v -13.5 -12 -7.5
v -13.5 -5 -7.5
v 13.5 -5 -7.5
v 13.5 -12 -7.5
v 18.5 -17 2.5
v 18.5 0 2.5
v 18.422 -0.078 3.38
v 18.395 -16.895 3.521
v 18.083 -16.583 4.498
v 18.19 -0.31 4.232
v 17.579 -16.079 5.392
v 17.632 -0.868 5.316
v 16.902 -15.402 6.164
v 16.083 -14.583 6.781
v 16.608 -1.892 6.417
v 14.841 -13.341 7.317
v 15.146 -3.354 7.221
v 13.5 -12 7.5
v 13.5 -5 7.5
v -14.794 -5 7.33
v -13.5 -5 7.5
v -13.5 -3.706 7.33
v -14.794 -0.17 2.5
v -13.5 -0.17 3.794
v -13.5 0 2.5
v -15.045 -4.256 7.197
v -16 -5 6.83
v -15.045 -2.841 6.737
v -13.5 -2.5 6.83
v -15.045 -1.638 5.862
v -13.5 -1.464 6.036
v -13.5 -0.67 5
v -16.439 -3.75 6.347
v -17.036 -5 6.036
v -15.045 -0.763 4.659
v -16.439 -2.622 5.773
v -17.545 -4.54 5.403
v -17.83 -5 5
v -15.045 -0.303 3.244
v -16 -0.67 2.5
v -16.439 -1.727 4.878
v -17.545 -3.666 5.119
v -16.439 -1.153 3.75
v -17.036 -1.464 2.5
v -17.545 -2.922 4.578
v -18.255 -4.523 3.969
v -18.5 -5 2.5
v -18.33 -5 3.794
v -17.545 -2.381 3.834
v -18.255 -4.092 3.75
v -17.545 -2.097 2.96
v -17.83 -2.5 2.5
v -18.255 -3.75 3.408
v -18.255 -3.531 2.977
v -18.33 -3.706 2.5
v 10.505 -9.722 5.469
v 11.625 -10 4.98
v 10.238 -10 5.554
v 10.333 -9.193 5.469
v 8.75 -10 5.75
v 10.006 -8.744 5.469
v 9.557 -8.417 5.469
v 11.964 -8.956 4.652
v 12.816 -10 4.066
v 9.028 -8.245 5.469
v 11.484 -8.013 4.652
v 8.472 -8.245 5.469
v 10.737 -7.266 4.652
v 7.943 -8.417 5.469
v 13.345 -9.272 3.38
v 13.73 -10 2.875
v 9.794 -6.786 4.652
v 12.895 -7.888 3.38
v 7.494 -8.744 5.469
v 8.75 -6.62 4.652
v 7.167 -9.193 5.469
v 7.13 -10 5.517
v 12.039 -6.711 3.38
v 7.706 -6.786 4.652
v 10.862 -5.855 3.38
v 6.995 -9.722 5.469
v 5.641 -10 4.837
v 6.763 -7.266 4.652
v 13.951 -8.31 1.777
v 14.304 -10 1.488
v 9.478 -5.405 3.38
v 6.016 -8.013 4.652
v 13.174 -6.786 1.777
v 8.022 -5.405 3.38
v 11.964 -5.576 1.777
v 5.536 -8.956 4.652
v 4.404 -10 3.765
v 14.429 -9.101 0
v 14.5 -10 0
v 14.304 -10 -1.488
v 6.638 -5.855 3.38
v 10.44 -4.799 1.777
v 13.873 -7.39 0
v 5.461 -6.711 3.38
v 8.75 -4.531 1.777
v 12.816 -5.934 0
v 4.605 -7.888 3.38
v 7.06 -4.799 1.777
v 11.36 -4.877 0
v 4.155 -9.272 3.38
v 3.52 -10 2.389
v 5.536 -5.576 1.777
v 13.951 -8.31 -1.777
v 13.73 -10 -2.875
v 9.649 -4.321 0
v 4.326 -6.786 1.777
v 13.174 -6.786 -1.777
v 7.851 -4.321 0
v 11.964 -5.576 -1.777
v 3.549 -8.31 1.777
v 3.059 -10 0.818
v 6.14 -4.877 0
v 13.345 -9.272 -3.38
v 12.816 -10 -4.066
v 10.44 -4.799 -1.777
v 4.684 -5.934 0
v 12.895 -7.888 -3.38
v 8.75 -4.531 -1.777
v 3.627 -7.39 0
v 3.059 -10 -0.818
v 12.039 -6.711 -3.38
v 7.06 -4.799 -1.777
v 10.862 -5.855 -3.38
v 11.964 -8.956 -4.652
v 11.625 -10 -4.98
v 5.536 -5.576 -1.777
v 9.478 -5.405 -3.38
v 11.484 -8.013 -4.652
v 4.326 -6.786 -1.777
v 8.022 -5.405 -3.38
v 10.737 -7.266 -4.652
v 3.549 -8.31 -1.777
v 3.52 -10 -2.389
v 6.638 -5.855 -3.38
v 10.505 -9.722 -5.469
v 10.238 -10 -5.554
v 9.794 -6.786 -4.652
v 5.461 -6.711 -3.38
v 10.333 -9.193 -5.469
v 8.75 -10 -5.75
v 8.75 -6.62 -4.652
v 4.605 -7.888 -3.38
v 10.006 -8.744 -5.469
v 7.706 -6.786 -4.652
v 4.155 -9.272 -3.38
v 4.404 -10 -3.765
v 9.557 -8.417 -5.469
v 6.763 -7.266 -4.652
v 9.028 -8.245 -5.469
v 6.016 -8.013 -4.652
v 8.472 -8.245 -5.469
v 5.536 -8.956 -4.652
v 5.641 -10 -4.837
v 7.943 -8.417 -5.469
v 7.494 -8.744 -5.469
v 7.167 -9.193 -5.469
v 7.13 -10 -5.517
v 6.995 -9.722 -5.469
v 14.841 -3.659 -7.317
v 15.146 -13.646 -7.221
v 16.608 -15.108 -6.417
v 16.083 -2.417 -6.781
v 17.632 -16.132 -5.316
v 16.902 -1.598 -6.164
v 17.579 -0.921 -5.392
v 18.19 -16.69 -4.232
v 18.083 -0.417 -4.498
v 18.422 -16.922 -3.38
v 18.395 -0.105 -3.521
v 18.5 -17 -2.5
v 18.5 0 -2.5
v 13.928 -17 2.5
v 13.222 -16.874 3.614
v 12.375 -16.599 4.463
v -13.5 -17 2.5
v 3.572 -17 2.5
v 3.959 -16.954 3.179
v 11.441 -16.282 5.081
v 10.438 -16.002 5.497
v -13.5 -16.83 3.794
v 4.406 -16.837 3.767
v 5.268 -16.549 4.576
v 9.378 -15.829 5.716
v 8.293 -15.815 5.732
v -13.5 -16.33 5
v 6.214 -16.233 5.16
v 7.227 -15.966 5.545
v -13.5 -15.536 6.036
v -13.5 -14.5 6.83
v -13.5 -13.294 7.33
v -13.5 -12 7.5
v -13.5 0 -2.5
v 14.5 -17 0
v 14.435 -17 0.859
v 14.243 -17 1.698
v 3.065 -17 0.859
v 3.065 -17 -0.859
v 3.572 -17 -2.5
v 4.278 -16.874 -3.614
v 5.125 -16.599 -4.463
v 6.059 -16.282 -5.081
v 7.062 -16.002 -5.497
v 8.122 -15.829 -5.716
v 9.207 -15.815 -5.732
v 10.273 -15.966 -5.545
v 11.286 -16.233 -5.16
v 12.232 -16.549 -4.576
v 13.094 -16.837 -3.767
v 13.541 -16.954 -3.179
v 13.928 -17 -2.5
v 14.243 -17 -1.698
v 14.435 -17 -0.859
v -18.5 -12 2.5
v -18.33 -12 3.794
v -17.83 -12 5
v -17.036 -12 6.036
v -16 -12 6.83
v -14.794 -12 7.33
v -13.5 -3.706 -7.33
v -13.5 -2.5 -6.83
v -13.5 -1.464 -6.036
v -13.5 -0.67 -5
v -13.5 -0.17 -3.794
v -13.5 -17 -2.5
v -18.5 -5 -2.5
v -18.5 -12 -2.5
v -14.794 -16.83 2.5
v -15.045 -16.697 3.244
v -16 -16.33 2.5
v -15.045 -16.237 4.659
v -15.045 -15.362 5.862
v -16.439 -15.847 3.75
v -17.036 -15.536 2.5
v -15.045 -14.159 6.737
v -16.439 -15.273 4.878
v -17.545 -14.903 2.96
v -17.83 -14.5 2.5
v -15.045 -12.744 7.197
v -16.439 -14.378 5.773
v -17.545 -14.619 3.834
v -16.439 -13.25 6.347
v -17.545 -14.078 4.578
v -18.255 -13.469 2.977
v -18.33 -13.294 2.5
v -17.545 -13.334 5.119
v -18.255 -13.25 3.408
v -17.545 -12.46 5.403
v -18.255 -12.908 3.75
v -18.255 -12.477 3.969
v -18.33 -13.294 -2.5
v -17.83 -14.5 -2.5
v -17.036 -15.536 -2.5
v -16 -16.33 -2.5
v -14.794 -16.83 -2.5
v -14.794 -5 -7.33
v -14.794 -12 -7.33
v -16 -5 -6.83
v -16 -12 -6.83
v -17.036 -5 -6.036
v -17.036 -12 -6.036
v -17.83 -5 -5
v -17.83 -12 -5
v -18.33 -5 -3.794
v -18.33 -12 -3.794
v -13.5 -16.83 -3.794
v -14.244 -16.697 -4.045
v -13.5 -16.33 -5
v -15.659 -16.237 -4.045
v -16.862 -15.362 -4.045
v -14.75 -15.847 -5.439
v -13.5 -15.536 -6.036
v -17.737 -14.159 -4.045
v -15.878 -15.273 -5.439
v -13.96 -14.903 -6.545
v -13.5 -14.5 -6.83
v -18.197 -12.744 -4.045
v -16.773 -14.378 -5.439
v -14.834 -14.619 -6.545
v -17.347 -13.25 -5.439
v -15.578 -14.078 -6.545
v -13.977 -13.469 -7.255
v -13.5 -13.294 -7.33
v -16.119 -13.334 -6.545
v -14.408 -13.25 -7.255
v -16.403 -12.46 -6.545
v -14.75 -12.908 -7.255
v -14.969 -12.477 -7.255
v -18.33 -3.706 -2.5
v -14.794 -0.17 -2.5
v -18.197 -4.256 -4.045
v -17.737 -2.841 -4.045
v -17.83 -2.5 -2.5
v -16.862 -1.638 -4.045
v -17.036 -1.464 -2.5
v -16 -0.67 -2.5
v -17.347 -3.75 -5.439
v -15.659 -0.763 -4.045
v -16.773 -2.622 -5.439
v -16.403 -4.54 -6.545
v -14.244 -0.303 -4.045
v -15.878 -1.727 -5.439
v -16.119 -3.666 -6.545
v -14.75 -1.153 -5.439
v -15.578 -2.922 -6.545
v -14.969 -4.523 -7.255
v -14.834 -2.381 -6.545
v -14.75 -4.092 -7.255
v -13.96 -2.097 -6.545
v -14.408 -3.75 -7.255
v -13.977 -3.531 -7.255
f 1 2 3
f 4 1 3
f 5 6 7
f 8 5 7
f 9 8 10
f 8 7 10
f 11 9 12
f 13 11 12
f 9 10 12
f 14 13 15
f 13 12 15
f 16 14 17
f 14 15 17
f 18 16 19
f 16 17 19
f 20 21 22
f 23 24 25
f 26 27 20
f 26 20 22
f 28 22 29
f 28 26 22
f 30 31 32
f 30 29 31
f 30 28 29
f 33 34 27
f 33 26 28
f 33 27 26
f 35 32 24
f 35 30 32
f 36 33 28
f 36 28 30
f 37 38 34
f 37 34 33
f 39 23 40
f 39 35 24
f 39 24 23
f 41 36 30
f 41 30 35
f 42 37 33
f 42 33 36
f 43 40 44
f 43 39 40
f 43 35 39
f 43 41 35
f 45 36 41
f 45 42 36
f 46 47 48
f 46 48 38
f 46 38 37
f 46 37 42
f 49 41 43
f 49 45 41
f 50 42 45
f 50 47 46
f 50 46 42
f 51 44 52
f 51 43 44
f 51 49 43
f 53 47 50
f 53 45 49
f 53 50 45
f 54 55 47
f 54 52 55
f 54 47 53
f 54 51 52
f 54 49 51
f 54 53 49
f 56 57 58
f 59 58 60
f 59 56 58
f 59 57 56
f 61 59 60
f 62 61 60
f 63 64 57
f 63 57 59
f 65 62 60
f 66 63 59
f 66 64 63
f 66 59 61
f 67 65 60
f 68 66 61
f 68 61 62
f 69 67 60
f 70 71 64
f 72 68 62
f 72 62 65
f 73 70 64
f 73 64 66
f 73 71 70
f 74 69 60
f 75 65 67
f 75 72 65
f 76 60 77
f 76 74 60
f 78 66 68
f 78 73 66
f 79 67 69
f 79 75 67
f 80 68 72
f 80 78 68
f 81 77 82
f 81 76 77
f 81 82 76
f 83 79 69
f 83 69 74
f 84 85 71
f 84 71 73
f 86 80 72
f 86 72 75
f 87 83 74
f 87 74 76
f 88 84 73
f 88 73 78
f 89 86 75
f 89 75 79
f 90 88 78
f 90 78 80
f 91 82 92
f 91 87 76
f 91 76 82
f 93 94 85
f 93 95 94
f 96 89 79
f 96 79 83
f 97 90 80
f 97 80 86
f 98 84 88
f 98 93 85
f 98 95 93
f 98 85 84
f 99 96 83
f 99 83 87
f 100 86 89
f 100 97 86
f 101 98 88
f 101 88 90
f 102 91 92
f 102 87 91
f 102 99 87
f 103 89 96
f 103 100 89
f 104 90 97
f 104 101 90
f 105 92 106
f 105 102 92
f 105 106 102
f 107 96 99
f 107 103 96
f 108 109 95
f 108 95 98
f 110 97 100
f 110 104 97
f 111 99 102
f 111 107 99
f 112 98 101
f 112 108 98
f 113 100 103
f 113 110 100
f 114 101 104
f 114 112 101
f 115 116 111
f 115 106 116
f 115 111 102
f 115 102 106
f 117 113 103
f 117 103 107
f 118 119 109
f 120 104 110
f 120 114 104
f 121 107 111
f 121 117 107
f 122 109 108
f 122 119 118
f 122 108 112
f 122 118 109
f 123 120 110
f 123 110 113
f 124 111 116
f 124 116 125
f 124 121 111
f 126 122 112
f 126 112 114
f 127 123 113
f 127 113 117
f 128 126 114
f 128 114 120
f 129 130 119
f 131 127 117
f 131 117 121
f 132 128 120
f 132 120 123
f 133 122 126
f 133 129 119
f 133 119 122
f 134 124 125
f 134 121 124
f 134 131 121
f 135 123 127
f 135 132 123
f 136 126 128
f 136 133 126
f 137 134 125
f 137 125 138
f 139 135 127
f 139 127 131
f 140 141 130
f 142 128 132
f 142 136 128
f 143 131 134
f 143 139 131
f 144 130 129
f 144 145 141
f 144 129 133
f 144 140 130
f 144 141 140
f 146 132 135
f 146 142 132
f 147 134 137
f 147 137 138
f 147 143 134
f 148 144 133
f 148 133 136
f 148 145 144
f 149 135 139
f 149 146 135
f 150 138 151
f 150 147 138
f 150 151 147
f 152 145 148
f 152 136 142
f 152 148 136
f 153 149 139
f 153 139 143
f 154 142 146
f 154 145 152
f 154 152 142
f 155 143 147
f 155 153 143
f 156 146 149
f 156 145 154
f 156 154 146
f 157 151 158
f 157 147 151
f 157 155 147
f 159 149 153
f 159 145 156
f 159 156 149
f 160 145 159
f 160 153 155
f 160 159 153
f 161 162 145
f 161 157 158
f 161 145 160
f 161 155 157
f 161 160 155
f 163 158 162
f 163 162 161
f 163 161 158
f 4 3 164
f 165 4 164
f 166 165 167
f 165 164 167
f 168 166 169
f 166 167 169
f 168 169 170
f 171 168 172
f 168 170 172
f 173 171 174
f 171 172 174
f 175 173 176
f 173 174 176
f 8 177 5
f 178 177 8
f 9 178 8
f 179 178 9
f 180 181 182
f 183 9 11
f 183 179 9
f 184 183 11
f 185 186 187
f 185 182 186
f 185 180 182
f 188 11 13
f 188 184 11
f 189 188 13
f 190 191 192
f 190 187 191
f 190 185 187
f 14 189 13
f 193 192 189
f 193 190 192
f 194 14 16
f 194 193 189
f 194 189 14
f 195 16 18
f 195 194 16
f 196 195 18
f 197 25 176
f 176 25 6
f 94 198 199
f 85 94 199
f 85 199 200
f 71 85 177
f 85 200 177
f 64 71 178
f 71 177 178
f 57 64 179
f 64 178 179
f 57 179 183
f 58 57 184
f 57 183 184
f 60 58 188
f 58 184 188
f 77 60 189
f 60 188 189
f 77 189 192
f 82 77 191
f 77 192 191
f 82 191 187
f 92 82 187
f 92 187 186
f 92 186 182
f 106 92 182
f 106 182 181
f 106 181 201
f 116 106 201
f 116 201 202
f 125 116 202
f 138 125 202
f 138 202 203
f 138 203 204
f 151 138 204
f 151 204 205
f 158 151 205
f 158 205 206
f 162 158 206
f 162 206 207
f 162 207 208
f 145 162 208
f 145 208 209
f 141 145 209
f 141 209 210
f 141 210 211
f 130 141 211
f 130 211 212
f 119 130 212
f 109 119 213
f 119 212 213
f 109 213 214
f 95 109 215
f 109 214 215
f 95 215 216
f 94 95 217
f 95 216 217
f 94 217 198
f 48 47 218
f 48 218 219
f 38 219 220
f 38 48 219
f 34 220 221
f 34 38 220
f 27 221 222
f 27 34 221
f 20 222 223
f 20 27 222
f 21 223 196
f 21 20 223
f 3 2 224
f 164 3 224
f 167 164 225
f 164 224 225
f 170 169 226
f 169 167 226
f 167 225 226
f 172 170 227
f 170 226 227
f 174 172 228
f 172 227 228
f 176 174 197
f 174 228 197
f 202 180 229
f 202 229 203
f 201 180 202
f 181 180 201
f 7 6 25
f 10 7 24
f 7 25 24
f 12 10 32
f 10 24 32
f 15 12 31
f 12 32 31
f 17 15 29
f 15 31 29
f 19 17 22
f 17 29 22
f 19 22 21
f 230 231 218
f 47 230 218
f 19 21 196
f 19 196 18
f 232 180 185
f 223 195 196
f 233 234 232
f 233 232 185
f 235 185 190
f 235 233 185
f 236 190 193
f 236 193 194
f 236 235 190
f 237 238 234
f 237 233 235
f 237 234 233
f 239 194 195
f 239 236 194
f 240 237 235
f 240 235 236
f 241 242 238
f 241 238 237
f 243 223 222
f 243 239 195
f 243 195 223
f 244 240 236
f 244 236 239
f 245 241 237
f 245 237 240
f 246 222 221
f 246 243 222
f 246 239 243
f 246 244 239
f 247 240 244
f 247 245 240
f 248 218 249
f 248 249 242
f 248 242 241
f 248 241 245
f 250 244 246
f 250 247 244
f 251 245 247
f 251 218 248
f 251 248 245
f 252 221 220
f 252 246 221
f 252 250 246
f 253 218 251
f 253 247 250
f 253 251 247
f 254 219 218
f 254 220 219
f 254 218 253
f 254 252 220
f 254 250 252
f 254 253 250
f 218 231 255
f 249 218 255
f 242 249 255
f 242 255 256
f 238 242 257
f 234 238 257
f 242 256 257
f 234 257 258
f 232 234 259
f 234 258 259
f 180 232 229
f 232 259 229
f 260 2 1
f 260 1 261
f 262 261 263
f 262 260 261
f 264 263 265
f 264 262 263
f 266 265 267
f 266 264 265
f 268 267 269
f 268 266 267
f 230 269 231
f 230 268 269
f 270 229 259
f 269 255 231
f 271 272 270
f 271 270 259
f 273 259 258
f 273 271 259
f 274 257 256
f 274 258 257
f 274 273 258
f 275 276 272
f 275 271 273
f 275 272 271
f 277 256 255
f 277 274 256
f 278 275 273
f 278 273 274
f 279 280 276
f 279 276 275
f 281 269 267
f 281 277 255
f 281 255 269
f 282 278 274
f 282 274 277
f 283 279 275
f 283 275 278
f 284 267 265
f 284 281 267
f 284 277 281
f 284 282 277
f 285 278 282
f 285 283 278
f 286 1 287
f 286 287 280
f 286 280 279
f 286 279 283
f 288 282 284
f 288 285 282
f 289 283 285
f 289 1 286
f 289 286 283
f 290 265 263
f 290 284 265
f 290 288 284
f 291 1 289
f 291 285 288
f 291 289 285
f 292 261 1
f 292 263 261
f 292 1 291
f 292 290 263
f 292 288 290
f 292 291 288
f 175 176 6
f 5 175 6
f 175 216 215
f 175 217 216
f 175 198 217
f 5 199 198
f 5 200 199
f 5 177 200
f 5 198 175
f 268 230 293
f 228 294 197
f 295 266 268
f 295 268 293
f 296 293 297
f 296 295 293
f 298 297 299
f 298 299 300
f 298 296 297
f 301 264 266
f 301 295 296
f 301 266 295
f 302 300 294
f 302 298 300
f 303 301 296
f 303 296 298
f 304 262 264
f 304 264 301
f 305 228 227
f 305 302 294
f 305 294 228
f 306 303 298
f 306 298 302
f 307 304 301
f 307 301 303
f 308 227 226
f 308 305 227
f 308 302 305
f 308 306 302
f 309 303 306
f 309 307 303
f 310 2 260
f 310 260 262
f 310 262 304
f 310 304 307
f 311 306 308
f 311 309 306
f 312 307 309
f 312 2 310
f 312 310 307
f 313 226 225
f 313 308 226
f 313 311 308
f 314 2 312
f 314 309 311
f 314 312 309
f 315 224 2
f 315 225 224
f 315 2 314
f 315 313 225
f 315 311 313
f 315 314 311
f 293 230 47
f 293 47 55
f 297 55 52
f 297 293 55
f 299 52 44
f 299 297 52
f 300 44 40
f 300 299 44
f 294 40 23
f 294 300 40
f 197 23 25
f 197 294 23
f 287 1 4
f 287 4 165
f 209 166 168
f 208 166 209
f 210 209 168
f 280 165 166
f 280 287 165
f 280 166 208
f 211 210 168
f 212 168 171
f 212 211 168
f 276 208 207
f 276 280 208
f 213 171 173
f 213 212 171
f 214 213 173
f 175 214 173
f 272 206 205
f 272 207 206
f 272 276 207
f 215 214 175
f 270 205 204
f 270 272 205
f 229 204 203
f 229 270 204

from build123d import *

# Parameters (mm, degrees)
F0_W         = 37
F0_H         = 15
F1_DEPTH     = 17
F2_R         = 5.75
F3_DEPTH     = 7
F6_T1_DEPTH  = 44.5
F6_T3_DEPTH  = 42
F6_T5_DEPTH  = 7
F6_T7_DEPTH  = 5
F6_S11_W     = 5
F6_S11_H     = 5
F6_T12_DEPTH = 5
F6_S17_W     = 5
F6_S17_H     = 5
F6_T18_DEPTH = 5
F6_S23_W     = 5
F6_S23_H     = 5
F6_T24_DEPTH = 5
F6_S29_W     = 5
F6_S29_H     = 5
F6_T30_DEPTH = 5


# Not quite as in the source:
# - a fillet or chamfer that OpenCascade refuses, or shapes differently, is made with other operations: its cross-section is extruded or revolved along the edge and cut away or added


with BuildPart() as f1:
    # F0 (on Front) → F1 (new body)
    with BuildSketch(Plane.XZ):
        Rectangle(F0_W, F0_H)
    extrude(amount=F1_DEPTH)

    # F2 (on face) → F3 (cut)
    with BuildSketch(Plane.XZ.offset(17)):
        with Locations((8.75, 0)):
            Circle(F2_R)
    extrude(amount=-F3_DEPTH, mode=Mode.SUBTRACT)

    # F4 (on face) → F5 (revolve, cut)
    with BuildSketch(Plane.XZ.offset(10)):
        with BuildLine():
            Line((8.75, 0), (8.75, 5.75))
            ThreePointArc((8.75, 5.75), (3, 0), (8.75, -5.75))
            Line((8.75, -5.75), (8.75, 0))
        make_face()
    revolve(axis=Axis((8.75, -10, 2.875), (0, 0, 1)), mode=Mode.SUBTRACT)

    # F6: fillet of radius 5 on 10 edges, made by hand

    # F6_s2 → F6_t1 (cut)
    with BuildSketch(Plane.YZ.offset(-13.5)):
        with BuildLine():
            ThreePointArc((-17, 2.5), (-15.5355339059, 6.0355339059), (-12, 7.5))
            Line((-12, 7.5), (-17, 7.5))
            Line((-17, 7.5), (-17, 2.5))
        make_face()
        with BuildLine():
            ThreePointArc((-12, -7.5), (-15.5355339059, -6.0355339059), (-17, -2.5))
            Line((-17, -2.5), (-17, -7.5))
            Line((-17, -7.5), (-12, -7.5))
        make_face()
        with BuildLine():
            ThreePointArc((0, 2.5), (-1.4644660941, 6.0355339059), (-5, 7.5))
            Line((-5, 7.5), (0, 7.5))
            Line((0, 7.5), (0, 2.5))
        make_face()
        with BuildLine():
            ThreePointArc((-5, -7.5), (-1.4644660941, -6.0355339059), (0, -2.5))
            Line((0, -2.5), (0, -7.5))
            Line((0, -7.5), (-5, -7.5))
        make_face()
    extrude(amount=F6_T1_DEPTH, mode=Mode.SUBTRACT)

    # F6_s4 → F6_t3 (cut)
    with BuildSketch(Plane.XZ.offset(-12.5)):
        with BuildLine():
            ThreePointArc((18.5, 2.5), (17.0355339059, 6.0355339059), (13.5, 7.5))
            Line((13.5, 7.5), (18.5, 7.5))
            Line((18.5, 7.5), (18.5, 2.5))
        make_face()
        with BuildLine():
            ThreePointArc((13.5, -7.5), (17.0355339059, -6.0355339059), (18.5, -2.5))
            Line((18.5, -2.5), (18.5, -7.5))
            Line((18.5, -7.5), (13.5, -7.5))
        make_face()
    extrude(amount=F6_T3_DEPTH, mode=Mode.SUBTRACT)

    # F6_s6 → F6_t5 (cut)
    with BuildSketch(Plane.XZ.offset(5)):
        with BuildLine():
            ThreePointArc((-18.5, 2.5), (-17.0355339059, 6.0355339059), (-13.5, 7.5))
            Line((-13.5, 7.5), (-18.5, 7.5))
            Line((-18.5, 7.5), (-18.5, 2.5))
        make_face()
        with BuildLine():
            ThreePointArc((-13.5, -7.5), (-17.0355339059, -6.0355339059), (-18.5, -2.5))
            Line((-18.5, -2.5), (-18.5, -7.5))
            Line((-18.5, -7.5), (-13.5, -7.5))
        make_face()
    extrude(amount=F6_T5_DEPTH, mode=Mode.SUBTRACT)

    # F6_s8 → F6_t7 (cut)
    with BuildSketch(Plane.XY.offset(-2.5)):
        with BuildLine():
            ThreePointArc((-18.5, -12), (-17.0355339059, -15.5355339059), (-13.5, -17))
            Line((-13.5, -17), (-18.5, -17))
            Line((-18.5, -17), (-18.5, -12))
        make_face()
        with BuildLine():
            ThreePointArc((-18.5, -5), (-17.0355339059, -1.4644660941), (-13.5, 0))
            Line((-13.5, 0), (-18.5, 0))
            Line((-18.5, 0), (-18.5, -5))
        make_face()
    extrude(amount=F6_T7_DEPTH, mode=Mode.SUBTRACT)


with BuildPart() as f6_tool10:
    # F6_s11 → F6_t12 (new body)
    with BuildSketch(Plane.YZ.offset(-13.5)):
        with Locations((-14.5, 5)):
            Rectangle(F6_S11_W, F6_S11_H)
    extrude(amount=-F6_T12_DEPTH)

    # F6_s13 → F6_t14 (revolve, cut)
    with BuildSketch(Plane(origin=(-13.5, -12, 2.5), x_dir=(0, 0.7071067812, -0.7071067812), z_dir=(0, 0.7071067812, 0.7071067812))):
        with BuildLine():
            ThreePointArc((0, -5), (5, 0), (0, 5))
            Line((0, 5), (0, -5))
        make_face()
    revolve(axis=Axis((-13.5, -12, 2.5), (-1, 0, 0)), mode=Mode.SUBTRACT)


with BuildPart() as f1_1:
    add(f1.part)

    # F6_t9: cut F6_tool10
    add(f6_tool10.part, mode=Mode.SUBTRACT)


with BuildPart() as f6_tool16:
    # F6_s17 → F6_t18 (new body)
    with BuildSketch(Plane.XY.offset(-2.5)):
        with Locations((-16, -14.5)):
            Rectangle(F6_S17_W, F6_S17_H)
    extrude(amount=-F6_T18_DEPTH)

    # F6_s19 → F6_t20 (revolve, cut)
    with BuildSketch(Plane(origin=(-13.5, -12, -2.5), x_dir=(0.7071067812, 0.7071067812, 0), z_dir=(-0.7071067812, 0.7071067812, 0))):
        with BuildLine():
            ThreePointArc((0, -5), (5, 0), (0, 5))
            Line((0, 5), (0, -5))
        make_face()
    revolve(axis=Axis((-13.5, -12, -2.5), (0, 0, -1)), mode=Mode.SUBTRACT)


with BuildPart() as f1_2:
    add(f1_1.part)

    # F6_t15: cut F6_tool16
    add(f6_tool16.part, mode=Mode.SUBTRACT)


with BuildPart() as f6_tool22:
    # F6_s23 → F6_t24 (new body)
    with BuildSketch(Plane.YZ.offset(-13.5)):
        with Locations((-2.5, 5)):
            Rectangle(F6_S23_W, F6_S23_H)
    extrude(amount=-F6_T24_DEPTH)

    # F6_s25 → F6_t26 (revolve, cut)
    with BuildSketch(Plane(origin=(-13.5, -5, 2.5), x_dir=(0, -0.7071067812, -0.7071067812), z_dir=(0, 0.7071067812, -0.7071067812))):
        with BuildLine():
            ThreePointArc((0, -5), (5, 0), (0, 5))
            Line((0, 5), (0, -5))
        make_face()
    revolve(axis=Axis((-13.5, -5, 2.5), (-1, 0, 0)), mode=Mode.SUBTRACT)


with BuildPart() as f1_3:
    add(f1_2.part)

    # F6_t21: cut F6_tool22
    add(f6_tool22.part, mode=Mode.SUBTRACT)


with BuildPart() as f6_tool28:
    # F6_s29 → F6_t30 (new body)
    with BuildSketch(Plane.XY.offset(-2.5)):
        with Locations((-16, -2.5)):
            Rectangle(F6_S29_W, F6_S29_H)
    extrude(amount=-F6_T30_DEPTH)

    # F6_s31 → F6_t32 (revolve, cut)
    with BuildSketch(Plane(origin=(-13.5, -5, -2.5), x_dir=(0.7071067812, -0.7071067812, 0), z_dir=(0.7071067812, 0.7071067812, 0))):
        with BuildLine():
            ThreePointArc((0, -5), (5, 0), (0, 5))
            Line((0, 5), (0, -5))
        make_face()
    revolve(axis=Axis((-13.5, -5, -2.5), (0, 0, -1)), mode=Mode.SUBTRACT)


with BuildPart() as f1_4:
    add(f1_3.part)

    # F6_t27: cut F6_tool28
    add(f6_tool28.part, mode=Mode.SUBTRACT)


solid = f1_4.part
